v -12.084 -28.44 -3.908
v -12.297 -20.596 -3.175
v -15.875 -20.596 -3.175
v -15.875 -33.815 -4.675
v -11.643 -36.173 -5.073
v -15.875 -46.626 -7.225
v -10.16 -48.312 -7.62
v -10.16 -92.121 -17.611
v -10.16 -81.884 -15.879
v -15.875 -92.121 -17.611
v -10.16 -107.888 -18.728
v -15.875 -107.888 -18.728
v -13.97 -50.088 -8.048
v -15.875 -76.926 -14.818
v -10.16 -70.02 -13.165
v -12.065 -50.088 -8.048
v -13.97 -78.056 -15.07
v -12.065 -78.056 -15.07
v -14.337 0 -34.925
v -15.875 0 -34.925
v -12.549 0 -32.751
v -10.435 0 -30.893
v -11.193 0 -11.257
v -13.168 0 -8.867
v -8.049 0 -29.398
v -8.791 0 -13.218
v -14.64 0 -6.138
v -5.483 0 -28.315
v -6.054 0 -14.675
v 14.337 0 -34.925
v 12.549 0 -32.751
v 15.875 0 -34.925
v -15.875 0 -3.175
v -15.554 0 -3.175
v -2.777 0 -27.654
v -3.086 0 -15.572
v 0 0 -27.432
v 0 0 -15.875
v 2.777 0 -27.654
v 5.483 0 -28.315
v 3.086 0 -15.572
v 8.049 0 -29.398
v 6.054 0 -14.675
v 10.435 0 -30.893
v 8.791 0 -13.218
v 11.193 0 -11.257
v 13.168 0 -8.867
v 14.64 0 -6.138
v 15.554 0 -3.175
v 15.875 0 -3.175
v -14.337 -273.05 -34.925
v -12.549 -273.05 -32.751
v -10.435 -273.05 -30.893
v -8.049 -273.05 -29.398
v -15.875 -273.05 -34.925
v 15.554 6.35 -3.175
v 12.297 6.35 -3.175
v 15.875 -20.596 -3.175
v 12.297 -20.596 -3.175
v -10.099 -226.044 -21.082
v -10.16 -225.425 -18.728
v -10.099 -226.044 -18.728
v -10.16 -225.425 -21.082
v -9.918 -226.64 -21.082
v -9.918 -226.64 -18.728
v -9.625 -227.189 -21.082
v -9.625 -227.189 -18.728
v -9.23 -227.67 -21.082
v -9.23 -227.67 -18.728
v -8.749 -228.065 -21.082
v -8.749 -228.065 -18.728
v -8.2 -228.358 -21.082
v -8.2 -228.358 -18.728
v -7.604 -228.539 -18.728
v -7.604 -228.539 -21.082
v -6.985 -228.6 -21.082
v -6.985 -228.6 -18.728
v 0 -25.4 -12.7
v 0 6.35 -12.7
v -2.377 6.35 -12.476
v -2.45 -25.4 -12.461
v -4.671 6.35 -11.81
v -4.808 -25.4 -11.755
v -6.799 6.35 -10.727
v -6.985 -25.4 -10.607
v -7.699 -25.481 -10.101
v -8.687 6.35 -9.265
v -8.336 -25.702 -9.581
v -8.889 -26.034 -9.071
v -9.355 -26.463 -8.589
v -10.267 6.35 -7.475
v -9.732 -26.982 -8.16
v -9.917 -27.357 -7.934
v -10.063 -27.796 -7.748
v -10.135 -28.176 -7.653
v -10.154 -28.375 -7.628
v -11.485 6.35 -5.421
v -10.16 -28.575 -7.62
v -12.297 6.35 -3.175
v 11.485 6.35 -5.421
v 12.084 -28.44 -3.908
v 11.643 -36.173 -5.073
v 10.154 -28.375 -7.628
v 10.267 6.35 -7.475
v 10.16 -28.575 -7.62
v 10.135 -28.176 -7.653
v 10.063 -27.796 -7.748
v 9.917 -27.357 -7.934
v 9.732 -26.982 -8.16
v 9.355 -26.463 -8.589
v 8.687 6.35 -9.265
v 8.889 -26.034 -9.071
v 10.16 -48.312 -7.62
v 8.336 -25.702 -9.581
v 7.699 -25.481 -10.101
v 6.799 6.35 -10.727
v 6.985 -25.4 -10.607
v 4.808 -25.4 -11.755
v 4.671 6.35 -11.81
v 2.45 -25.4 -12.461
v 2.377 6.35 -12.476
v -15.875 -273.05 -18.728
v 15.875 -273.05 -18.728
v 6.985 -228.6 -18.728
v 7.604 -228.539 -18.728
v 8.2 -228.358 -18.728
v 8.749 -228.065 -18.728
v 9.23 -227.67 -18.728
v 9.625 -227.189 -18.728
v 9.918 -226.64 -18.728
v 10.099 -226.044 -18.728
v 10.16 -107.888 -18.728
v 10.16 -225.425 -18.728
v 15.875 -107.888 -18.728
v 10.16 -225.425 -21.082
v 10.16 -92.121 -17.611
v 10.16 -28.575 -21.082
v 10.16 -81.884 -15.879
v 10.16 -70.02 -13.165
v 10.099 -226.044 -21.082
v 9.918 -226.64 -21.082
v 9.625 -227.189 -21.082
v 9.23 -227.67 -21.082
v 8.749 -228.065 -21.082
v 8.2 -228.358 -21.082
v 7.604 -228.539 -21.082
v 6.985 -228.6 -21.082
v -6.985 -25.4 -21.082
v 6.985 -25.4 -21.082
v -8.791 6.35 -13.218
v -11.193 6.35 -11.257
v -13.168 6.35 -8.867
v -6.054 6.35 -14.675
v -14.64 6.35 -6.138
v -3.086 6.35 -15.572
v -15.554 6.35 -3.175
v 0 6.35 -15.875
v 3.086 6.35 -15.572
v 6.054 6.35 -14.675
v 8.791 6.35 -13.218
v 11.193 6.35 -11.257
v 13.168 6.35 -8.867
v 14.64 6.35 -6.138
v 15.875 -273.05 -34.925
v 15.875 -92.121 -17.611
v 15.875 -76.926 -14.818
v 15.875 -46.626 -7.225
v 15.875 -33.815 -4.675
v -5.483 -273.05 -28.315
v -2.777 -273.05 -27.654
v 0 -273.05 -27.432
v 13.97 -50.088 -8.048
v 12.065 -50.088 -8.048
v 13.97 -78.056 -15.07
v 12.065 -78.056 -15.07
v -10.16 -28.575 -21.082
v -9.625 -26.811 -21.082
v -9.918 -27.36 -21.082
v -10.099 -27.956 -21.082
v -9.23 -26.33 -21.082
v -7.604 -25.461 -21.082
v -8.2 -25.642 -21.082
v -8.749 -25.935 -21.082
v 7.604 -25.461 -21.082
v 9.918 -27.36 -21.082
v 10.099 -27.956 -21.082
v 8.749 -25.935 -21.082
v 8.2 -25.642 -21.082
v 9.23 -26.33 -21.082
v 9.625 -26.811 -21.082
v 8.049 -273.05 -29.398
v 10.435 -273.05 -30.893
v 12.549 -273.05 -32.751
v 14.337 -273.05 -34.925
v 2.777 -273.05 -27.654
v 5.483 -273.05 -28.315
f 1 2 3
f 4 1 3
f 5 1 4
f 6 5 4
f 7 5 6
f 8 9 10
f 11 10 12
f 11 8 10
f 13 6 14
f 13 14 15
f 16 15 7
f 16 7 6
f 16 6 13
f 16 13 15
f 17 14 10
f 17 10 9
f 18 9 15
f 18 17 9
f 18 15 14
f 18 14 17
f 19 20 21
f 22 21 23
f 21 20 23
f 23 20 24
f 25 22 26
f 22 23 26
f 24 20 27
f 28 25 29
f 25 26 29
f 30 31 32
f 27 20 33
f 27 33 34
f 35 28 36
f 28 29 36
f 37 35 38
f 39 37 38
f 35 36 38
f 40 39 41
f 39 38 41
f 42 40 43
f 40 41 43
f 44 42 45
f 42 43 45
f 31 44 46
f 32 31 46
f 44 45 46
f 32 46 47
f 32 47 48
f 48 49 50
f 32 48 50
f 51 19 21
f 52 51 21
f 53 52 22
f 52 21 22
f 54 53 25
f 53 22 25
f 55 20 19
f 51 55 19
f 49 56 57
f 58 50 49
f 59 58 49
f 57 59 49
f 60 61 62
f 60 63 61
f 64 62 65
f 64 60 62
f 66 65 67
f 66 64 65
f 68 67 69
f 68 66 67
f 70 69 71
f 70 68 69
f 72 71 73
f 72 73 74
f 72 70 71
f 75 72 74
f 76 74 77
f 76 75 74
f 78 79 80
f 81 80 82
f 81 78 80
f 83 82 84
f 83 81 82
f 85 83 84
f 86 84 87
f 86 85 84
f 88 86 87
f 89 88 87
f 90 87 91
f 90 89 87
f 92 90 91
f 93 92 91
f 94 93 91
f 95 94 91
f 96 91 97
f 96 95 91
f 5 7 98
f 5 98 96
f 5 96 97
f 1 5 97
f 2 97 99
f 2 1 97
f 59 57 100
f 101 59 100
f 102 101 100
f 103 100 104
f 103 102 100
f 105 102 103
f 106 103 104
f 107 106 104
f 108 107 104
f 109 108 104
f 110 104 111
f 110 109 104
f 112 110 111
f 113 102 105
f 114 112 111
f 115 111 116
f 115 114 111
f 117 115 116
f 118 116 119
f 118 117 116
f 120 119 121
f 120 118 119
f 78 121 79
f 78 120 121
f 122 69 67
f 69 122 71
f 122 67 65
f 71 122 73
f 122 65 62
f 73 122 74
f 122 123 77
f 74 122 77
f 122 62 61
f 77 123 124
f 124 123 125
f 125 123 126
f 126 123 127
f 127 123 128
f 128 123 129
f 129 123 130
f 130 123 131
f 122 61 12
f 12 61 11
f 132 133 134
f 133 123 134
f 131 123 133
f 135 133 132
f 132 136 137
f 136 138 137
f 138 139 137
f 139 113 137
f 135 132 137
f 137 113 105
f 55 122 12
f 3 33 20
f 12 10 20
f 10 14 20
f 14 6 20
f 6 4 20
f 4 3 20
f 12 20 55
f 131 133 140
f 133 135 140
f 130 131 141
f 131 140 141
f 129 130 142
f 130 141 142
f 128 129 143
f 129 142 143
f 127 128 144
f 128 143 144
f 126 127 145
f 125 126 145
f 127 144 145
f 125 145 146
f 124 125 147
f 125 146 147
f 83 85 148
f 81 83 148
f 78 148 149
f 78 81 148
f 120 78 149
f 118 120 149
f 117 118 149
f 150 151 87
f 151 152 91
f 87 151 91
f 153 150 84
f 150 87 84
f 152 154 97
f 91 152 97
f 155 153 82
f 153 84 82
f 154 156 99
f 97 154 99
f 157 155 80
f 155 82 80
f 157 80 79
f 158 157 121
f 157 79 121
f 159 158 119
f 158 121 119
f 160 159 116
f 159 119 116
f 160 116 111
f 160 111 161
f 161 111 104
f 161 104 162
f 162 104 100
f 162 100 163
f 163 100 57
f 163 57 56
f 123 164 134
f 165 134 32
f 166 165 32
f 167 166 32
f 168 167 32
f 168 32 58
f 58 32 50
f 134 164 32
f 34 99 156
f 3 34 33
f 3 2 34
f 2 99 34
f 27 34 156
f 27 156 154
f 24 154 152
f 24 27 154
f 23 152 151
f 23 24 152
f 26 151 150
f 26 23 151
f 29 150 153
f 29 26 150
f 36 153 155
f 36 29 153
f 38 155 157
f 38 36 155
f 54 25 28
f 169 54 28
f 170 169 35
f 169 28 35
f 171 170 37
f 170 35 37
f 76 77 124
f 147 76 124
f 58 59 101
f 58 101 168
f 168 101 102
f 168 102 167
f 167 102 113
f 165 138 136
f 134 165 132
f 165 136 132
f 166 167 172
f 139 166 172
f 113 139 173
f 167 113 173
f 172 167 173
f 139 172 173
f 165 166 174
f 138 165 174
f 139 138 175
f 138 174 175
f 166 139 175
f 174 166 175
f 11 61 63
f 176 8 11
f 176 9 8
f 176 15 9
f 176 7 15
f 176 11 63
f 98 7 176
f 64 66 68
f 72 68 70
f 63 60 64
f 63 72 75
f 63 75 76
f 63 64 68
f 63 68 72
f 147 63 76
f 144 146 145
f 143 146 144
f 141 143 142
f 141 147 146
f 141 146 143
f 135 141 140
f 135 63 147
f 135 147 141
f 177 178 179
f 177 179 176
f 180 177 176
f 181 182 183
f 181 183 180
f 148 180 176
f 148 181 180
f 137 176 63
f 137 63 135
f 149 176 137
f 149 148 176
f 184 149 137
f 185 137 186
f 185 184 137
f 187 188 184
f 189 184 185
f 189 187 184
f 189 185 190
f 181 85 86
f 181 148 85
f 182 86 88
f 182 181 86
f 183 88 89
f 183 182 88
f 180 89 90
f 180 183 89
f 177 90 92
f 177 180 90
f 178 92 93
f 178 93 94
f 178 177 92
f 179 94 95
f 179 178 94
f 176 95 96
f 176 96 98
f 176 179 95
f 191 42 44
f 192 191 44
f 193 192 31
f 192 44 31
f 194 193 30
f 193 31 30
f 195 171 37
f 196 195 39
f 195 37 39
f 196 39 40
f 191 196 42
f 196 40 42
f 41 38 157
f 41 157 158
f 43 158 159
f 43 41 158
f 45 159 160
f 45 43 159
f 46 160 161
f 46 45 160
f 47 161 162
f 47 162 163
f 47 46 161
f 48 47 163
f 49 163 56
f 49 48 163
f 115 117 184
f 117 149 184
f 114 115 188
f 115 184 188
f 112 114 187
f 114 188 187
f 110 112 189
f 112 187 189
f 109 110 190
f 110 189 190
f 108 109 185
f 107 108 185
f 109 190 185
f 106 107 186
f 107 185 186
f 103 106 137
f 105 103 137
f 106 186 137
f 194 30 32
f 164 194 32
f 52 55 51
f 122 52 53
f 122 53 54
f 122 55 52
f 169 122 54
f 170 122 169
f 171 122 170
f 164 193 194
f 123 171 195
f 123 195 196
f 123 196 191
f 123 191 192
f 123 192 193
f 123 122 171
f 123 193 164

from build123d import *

# Parameters (mm, degrees)
F1_DEPTH = 273.05
F2_DEPTH = 6.35
F4_DEPTH = 25.4
F5_W     = 20.32
F5_H     = 203.2
F6_DEPTH = 21.082
F7_R     = 3.175


with BuildPart() as f1:
    # F0 (on Front) → F1 (new body)
    with BuildSketch(Plane.XZ):
        with BuildLine():
            Line((15.875, -3.175), (15.55426, -3.175))
            ThreePointArc((15.55426, -3.175), (10.040232, -12.296722), (0, -15.875))
            Line((0, -15.875), (0, -26.67))
            ThreePointArc((0, -26.67), (8.358623, -25.326317), (15.875, -21.430662))
            Line((15.875, -21.430662), (15.875, -3.175))
        make_face()
        with BuildLine():
            ThreePointArc((0, -15.875), (-10.040232, -12.296722), (-15.55426, -3.175))
            Line((-15.55426, -3.175), (-15.875, -3.175))
            Line((-15.875, -3.175), (-15.875, -21.430662))
            ThreePointArc((-15.875, -21.430662), (-8.358623, -25.326317), (0, -26.67))
            Line((0, -26.67), (0, -15.875))
        make_face()
        with BuildLine():
            ThreePointArc((15.875, -21.430662), (8.358623, -25.326317), (0, -26.67))
            Line((0, -26.67), (0, -27.432))
            ThreePointArc((0, -27.432), (4.143033, -27.930592), (8.049481, -29.397895))
            ThreePointArc((8.049481, -29.397895), (12.080918, -27.983599), (15.875, -26.019508))
            Line((15.875, -26.019508), (15.875, -21.430662))
        make_face()
        with BuildLine():
            ThreePointArc((-8.049481, -29.397895), (-12.080918, -27.983599), (-15.875, -26.019508))
            Line((-15.875, -26.019508), (-15.875, -34.925))
            Line((-15.875, -34.925), (-14.336944, -34.925))
            ThreePointArc((-14.336944, -34.925), (-11.529321, -31.779102), (-8.049481, -29.397895))
        make_face()
        with BuildLine():
            Line((0, -27.432), (0, -26.67))
            ThreePointArc((0, -26.67), (-8.358623, -25.326317), (-15.875, -21.430662))
            Line((-15.875, -21.430662), (-15.875, -26.019508))
            ThreePointArc((-15.875, -26.019508), (-12.080918, -27.983599), (-8.049481, -29.397895))
            ThreePointArc((-8.049481, -29.397895), (-4.143033, -27.930592), (0, -27.432))
        make_face()
        with BuildLine():
            Line((15.875, -34.925), (15.875, -26.019508))
            ThreePointArc((15.875, -26.019508), (12.080918, -27.983599), (8.049481, -29.397895))
            ThreePointArc((8.049481, -29.397895), (11.529321, -31.779102), (14.336944, -34.925))
            Line((14.336944, -34.925), (15.875, -34.925))
        make_face()
        with BuildLine():
            ThreePointArc((0, -12.7), (-7.77713, -10.040232), (-12.296722, -3.175))
            Line((-12.296722, -3.175), (-15.55426, -3.175))
            ThreePointArc((-15.55426, -3.175), (-10.040232, -12.296722), (0, -15.875))
            Line((0, -15.875), (0, -12.7))
        make_face()
        with BuildLine():
            Line((15.55426, -3.175), (12.296722, -3.175))
            ThreePointArc((12.296722, -3.175), (7.77713, -10.040232), (0, -12.7))
            Line((0, -12.7), (0, -15.875))
            ThreePointArc((0, -15.875), (10.040232, -12.296722), (15.55426, -3.175))
        make_face()
    extrude(amount=F1_DEPTH)

    # F0 (on Front) → F2 (join)
    with BuildSketch(Plane.XZ):
        with BuildLine():
            ThreePointArc((0, -12.7), (-7.77713, -10.040232), (-12.296722, -3.175))
            Line((-12.296722, -3.175), (-15.55426, -3.175))
            ThreePointArc((-15.55426, -3.175), (-10.040232, -12.296722), (0, -15.875))
            Line((0, -15.875), (0, -12.7))
        make_face()
        with BuildLine():
            Line((15.55426, -3.175), (12.296722, -3.175))
            ThreePointArc((12.296722, -3.175), (7.77713, -10.040232), (0, -12.7))
            Line((0, -12.7), (0, -15.875))
            ThreePointArc((0, -15.875), (10.040232, -12.296722), (15.55426, -3.175))
        make_face()
    extrude(amount=-F2_DEPTH)

    # F3 (on Right) → F4 (cut, symmetric)
    with BuildSketch(Plane.YZ):
        with BuildLine():
            Line((-285.688049, -3.085141), (-285.688049, -18.728113))
            Line((-285.688049, -18.728113), (-107.888049, -18.728113))
            add(Edge.make_bspline(
                [(-18.988049, -3.085141), (-51.164284, -4.672805), (-75.452253, -18.588752), (-107.888049, -18.728113)],
                knots=[0, 0, 0, 0, 90.265789, 90.265789, 90.265789, 90.265789], degree=3))
            Line((-18.988049, -3.085141), (-285.688049, -3.085141))
        make_face()
    extrude(amount=F4_DEPTH, both=True, mode=Mode.SUBTRACT)

    # F5 (on Top) → F6 (cut)
    with BuildSketch(Plane.XY):
        with Locations((0, -127)):
            Rectangle(F5_W, F5_H)
    extrude(amount=-F6_DEPTH, mode=Mode.SUBTRACT)

    # F7
    f7_edges = [f1.edges().sort_by_distance(p)[0] for p in [
        (-10.16, -25.4, -14.351),
        (10.16, -25.4, -14.351),
        (-10.16, -228.6, -19.905056),
        (10.16, -228.6, -19.905056),
    ]]
    fillet(f7_edges, radius=F7_R)


solid = f1.part
